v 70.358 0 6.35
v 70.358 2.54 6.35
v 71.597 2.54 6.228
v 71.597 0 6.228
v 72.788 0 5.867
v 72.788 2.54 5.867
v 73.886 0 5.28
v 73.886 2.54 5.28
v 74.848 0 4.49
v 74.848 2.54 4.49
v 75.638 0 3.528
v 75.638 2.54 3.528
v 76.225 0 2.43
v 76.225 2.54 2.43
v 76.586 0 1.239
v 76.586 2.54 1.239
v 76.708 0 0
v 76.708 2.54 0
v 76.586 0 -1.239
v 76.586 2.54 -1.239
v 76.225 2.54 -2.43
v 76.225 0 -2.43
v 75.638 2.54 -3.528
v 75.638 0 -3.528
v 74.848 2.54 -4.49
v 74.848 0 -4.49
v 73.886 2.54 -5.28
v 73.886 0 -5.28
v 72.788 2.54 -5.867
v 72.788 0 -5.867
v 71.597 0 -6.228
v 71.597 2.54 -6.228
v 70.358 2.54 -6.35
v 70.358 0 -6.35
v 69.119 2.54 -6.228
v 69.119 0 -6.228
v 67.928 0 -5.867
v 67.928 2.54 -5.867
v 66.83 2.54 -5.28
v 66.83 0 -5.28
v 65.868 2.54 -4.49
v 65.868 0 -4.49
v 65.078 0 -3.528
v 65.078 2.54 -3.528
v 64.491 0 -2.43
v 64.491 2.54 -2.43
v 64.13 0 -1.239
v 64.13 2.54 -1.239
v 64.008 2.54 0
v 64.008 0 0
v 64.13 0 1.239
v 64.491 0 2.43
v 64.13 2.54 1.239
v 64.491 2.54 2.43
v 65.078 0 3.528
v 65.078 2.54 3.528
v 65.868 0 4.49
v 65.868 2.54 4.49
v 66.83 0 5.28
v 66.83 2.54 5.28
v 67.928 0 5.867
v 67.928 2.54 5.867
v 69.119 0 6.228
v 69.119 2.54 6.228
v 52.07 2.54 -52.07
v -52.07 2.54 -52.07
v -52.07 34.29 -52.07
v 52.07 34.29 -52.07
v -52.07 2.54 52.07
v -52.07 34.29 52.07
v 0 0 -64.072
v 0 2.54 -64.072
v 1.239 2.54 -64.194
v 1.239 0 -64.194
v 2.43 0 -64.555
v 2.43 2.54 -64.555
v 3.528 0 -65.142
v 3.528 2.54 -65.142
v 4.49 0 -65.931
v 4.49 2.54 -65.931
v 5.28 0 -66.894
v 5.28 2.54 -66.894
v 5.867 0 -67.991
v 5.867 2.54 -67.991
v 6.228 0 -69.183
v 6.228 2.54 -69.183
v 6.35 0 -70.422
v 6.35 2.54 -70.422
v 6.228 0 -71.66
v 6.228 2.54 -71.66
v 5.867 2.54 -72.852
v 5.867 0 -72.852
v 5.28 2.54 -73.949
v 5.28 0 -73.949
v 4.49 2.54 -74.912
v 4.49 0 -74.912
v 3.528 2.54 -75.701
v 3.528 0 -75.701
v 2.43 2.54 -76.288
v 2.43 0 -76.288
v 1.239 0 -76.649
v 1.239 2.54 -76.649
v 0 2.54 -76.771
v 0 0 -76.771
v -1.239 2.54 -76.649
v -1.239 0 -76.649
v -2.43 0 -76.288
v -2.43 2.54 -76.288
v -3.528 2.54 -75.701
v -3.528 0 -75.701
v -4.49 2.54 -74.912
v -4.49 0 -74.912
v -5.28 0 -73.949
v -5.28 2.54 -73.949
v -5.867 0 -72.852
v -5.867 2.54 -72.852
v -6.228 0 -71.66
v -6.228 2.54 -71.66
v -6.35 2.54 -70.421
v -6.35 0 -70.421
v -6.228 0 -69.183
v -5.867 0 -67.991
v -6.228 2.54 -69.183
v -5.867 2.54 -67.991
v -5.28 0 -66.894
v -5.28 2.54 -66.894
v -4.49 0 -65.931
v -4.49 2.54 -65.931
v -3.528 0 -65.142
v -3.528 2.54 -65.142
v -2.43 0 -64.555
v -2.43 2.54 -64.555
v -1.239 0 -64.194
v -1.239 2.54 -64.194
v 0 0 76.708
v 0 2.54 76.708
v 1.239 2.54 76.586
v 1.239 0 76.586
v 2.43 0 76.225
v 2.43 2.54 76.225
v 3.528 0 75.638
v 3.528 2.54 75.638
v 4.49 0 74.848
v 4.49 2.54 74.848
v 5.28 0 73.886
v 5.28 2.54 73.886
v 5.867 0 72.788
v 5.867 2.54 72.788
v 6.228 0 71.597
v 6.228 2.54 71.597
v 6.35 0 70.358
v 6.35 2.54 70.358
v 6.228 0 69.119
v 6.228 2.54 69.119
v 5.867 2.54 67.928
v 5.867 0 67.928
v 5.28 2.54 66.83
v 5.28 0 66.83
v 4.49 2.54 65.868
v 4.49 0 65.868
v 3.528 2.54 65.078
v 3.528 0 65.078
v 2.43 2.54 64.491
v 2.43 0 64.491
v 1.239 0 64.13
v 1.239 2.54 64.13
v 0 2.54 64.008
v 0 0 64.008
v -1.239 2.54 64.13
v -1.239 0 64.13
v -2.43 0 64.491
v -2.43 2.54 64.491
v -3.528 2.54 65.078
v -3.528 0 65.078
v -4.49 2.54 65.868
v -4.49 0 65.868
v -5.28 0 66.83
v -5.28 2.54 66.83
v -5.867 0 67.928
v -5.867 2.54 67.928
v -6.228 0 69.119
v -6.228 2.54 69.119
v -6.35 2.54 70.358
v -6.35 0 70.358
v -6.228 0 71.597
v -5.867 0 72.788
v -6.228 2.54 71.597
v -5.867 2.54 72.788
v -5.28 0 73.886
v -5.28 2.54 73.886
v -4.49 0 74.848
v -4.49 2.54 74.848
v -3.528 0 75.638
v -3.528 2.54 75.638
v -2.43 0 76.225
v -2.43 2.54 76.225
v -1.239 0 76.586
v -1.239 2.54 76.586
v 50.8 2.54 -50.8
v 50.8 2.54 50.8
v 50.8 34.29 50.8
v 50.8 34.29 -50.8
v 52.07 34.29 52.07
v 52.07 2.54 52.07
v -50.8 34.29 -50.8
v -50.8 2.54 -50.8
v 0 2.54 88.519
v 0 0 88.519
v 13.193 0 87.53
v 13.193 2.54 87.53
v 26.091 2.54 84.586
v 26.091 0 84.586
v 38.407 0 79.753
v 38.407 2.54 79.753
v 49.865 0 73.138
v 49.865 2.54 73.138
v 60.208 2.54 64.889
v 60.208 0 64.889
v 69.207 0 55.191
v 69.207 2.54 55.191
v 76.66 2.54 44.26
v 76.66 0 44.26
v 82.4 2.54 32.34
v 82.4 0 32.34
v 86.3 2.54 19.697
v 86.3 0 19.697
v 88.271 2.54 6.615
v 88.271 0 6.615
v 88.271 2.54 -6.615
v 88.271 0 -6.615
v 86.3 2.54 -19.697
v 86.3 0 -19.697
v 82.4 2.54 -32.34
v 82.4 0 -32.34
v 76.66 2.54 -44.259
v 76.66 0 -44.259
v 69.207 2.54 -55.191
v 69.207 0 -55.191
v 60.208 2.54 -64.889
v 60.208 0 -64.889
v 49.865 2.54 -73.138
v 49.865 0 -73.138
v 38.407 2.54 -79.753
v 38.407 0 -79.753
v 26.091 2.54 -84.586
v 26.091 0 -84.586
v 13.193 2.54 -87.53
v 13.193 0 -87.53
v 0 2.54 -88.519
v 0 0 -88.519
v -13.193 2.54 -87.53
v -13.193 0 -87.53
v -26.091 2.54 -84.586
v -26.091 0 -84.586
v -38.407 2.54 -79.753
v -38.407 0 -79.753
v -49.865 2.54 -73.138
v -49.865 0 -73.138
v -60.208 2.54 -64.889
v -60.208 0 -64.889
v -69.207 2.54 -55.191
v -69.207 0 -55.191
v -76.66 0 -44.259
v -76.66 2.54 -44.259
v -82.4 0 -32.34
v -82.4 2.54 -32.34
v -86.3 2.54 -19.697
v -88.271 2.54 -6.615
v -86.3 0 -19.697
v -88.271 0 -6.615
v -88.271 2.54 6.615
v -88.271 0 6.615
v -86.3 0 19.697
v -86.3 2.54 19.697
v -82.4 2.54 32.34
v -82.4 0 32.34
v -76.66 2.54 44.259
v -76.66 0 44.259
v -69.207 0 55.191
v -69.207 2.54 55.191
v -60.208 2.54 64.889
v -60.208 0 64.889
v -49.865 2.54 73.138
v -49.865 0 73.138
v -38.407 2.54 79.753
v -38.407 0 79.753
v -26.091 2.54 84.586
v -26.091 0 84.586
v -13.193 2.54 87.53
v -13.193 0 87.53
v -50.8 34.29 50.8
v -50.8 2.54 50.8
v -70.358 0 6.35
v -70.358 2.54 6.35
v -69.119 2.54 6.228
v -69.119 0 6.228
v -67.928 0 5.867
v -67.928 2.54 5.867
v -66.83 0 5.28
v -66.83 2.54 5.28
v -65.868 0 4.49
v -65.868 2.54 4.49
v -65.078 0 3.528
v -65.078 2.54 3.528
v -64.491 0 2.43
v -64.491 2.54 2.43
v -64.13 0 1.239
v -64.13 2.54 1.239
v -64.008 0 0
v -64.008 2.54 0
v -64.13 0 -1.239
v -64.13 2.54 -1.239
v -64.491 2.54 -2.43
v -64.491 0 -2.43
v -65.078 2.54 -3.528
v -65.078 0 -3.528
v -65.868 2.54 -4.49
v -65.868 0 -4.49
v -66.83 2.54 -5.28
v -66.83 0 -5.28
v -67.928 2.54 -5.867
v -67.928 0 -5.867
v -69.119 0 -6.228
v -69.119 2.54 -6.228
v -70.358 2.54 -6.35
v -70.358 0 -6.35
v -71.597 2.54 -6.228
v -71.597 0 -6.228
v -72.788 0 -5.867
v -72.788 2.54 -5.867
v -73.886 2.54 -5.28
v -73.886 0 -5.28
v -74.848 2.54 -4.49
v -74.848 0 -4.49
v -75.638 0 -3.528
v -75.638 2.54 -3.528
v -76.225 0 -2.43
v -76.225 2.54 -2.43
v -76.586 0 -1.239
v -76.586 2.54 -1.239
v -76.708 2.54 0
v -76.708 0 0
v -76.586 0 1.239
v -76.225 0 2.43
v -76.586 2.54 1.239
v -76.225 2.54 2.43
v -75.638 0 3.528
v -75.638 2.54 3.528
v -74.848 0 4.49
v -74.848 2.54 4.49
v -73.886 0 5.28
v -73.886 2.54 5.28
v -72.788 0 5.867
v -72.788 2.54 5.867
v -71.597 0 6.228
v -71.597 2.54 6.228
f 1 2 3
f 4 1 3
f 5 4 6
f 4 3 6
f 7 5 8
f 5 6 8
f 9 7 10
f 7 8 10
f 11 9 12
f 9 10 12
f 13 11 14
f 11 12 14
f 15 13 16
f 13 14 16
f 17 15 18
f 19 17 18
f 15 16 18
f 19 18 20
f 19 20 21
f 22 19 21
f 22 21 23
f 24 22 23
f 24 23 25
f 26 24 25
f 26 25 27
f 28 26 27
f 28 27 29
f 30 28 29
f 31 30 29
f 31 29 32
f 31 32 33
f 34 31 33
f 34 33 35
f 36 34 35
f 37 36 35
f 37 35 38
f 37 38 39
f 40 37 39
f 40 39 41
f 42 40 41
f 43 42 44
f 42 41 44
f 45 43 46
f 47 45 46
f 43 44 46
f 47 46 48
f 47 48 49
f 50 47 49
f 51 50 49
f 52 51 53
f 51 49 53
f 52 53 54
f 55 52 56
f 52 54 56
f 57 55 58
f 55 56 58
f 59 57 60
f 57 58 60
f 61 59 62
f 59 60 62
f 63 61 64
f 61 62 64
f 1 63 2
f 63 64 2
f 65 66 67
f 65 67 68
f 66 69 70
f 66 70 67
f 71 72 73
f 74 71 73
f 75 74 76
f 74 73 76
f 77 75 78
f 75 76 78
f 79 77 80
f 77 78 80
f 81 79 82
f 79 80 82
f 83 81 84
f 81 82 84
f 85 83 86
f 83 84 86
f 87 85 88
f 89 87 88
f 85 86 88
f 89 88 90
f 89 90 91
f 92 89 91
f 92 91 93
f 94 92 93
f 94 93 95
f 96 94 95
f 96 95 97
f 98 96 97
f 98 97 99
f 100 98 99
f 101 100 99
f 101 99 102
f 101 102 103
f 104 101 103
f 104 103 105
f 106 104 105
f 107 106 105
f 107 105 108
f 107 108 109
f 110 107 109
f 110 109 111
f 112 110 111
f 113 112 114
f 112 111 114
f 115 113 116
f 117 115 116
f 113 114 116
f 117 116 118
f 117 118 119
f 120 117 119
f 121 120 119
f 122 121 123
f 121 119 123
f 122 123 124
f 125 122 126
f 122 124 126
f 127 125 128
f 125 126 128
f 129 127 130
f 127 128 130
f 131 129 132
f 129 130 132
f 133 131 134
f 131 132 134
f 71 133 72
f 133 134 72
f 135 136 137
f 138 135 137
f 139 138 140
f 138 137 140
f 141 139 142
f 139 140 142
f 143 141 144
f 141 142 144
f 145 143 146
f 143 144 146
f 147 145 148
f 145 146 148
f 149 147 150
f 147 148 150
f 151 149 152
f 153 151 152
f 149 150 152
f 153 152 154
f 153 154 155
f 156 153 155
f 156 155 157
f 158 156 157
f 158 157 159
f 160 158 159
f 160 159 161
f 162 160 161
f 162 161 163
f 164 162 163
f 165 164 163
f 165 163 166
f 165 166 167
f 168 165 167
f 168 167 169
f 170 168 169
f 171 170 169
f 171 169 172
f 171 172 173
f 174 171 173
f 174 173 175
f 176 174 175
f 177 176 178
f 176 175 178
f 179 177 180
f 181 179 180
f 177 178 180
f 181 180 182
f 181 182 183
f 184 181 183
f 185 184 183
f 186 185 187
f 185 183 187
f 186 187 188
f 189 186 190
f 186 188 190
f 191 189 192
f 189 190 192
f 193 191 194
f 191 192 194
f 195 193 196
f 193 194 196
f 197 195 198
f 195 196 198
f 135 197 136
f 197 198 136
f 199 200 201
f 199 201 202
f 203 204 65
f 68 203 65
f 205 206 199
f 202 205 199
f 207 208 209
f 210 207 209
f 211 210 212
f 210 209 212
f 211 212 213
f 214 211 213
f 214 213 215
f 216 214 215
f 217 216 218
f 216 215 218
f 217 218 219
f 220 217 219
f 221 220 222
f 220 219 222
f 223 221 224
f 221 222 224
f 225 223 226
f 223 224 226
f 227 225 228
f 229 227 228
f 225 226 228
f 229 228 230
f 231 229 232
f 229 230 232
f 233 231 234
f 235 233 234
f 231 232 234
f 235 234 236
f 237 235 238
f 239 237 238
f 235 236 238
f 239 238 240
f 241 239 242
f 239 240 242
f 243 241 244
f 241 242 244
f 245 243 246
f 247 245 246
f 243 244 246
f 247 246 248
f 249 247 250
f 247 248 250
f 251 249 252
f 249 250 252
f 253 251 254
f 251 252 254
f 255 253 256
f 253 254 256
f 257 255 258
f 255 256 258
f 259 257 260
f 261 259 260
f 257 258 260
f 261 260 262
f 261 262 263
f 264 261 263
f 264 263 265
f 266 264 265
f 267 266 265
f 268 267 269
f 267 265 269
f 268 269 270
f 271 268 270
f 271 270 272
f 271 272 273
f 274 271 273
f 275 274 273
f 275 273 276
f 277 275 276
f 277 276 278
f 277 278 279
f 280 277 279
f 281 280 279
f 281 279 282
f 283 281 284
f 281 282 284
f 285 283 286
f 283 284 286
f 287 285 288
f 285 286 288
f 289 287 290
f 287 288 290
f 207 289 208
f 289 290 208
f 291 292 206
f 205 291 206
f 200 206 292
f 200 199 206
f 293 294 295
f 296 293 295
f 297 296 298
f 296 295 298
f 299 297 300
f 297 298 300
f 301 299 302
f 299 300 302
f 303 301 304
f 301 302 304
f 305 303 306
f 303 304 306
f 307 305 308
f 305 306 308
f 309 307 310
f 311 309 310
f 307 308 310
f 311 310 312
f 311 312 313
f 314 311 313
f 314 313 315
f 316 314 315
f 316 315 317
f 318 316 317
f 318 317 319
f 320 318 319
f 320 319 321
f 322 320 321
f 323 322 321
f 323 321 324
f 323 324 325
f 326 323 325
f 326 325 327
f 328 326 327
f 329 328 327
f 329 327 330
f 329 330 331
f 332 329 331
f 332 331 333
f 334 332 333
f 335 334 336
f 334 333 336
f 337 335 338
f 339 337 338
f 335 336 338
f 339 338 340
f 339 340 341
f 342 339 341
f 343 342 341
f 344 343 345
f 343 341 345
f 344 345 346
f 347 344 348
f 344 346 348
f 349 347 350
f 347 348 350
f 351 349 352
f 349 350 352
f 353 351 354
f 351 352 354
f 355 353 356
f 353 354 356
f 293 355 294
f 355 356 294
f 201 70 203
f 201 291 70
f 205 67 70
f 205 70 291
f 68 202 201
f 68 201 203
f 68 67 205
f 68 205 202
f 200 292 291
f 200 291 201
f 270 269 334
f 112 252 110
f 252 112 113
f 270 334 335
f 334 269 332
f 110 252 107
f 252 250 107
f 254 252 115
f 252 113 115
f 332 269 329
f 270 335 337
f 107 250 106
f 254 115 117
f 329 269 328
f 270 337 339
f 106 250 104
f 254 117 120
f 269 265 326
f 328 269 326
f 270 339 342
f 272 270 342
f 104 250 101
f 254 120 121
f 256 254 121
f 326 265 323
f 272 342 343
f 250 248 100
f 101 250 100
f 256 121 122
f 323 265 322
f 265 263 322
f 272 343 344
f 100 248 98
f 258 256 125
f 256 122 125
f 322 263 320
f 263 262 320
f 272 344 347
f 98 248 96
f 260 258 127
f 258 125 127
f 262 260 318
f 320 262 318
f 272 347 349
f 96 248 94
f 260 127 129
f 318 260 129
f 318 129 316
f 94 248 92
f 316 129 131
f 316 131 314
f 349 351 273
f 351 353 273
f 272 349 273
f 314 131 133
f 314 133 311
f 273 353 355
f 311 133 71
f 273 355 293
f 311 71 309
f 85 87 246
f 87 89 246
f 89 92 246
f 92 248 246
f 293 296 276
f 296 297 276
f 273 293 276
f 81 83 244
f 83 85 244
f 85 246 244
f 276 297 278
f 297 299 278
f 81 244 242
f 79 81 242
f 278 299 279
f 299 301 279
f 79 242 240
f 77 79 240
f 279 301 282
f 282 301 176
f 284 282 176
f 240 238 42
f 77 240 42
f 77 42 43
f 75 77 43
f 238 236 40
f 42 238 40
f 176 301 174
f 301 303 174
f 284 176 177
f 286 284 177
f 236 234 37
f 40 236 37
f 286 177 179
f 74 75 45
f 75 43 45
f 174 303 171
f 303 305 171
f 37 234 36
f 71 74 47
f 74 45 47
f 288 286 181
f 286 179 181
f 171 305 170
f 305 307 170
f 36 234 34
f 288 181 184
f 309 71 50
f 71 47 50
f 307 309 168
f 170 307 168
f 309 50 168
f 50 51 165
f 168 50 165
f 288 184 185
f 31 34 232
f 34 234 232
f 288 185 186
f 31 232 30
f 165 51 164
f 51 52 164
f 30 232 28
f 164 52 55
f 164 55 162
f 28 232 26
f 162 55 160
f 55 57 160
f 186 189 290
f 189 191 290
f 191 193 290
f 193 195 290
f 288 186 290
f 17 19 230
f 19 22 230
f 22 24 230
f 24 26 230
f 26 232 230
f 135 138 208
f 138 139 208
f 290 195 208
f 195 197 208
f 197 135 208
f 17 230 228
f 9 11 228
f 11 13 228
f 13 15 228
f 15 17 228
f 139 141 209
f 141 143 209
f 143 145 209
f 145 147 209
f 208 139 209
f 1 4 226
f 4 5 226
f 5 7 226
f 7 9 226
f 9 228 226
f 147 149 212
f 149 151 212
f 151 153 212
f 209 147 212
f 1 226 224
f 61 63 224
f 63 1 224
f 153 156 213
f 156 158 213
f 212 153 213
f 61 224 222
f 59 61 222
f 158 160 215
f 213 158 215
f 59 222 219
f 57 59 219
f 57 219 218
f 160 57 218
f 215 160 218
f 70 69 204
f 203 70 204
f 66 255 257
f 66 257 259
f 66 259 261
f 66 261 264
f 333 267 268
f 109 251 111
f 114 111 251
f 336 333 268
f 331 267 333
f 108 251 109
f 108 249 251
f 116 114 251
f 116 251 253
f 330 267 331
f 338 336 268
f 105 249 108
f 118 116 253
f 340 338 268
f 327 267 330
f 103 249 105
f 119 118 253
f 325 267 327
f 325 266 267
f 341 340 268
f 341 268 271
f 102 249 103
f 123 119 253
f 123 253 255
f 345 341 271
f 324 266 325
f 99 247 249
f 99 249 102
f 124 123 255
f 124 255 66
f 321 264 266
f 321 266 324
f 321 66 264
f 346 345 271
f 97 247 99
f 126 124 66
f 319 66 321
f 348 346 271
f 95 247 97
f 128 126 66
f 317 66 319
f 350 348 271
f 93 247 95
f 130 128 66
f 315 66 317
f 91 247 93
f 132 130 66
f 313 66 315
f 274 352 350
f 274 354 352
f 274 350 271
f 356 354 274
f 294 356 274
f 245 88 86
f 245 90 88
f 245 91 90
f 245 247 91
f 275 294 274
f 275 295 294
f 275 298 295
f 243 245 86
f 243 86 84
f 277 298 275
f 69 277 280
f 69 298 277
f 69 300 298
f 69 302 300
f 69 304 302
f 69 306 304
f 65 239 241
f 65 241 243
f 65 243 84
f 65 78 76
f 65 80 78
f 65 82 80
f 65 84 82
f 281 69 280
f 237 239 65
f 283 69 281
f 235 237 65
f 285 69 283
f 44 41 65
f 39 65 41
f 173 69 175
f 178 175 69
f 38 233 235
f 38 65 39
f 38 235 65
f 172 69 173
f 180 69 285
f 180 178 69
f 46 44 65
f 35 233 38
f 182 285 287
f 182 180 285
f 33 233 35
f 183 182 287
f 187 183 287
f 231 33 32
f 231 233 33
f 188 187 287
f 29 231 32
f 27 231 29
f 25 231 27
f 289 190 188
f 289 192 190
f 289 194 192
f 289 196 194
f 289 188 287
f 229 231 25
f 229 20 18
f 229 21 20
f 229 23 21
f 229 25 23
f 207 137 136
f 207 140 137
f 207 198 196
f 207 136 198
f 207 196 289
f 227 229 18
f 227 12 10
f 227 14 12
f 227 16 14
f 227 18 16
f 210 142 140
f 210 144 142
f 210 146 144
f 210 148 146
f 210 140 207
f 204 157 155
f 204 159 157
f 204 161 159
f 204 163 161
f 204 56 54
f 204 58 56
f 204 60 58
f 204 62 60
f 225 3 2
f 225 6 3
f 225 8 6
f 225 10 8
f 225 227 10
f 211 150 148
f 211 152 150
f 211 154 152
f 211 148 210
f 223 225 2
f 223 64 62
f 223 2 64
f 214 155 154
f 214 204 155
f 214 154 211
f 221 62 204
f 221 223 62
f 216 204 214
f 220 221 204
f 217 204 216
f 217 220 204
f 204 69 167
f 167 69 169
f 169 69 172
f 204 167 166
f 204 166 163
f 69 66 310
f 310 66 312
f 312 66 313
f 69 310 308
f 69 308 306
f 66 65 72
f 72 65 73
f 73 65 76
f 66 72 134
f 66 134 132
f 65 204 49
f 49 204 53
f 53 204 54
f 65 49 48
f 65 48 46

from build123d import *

# Parameters (mm, degrees)
SKETCH1_R           = 88.519
BOSS_EXTRUDE1_DEPTH = 2.54
SKETCH3_W           = 104.14
SKETCH3_H           = 104.14
SKETCH3_W_2         = 101.6
SKETCH3_H_2         = 101.6
BOSS_EXTRUDE2_DEPTH = 31.75
SKETCH4_R           = 6.35
CUT_EXTRUDE1_DEPTH  = 130.148322568


with BuildPart() as part:
    # Sketch1 → Boss-Extrude1 (new body)
    with BuildSketch(Plane(origin=(0, 0, 0), x_dir=(1, 0, 0), z_dir=(0, 1, 0))):
        with Locations(Location((0, 0, 0), (0, 0, 270))):
            Circle(SKETCH1_R)
    extrude(amount=BOSS_EXTRUDE1_DEPTH)

    # Sketch3 → Boss-Extrude2 (add)
    with BuildSketch(Plane(origin=(0, 2.54, 0), x_dir=(1, 0, 0), z_dir=(0, 1, 0))):
        Rectangle(SKETCH3_W, SKETCH3_H)
        Rectangle(SKETCH3_W_2, SKETCH3_H_2, mode=Mode.SUBTRACT)
    extrude(amount=BOSS_EXTRUDE2_DEPTH)

    # Sketch4 → Cut-Extrude1 (cut, through all)
    with BuildSketch(Plane(origin=(0, 2.54, 0), x_dir=(1, 0, 0), z_dir=(0, 1, 0))):
        with Locations(Location((0, 70.4215, 0), (0, 0, 270))):
            Circle(SKETCH4_R)
        with Locations(Location((0, -70.358, 0), (0, 0, 270))):
            Circle(SKETCH4_R)
        with Locations(Location((70.358, 0, 0), (0, 0, 270))):
            Circle(SKETCH4_R)
        with Locations(Location((-70.358, 0, 0), (0, 0, 270))):
            Circle(SKETCH4_R)
    extrude(amount=-CUT_EXTRUDE1_DEPTH, mode=Mode.SUBTRACT)


solid = part.part
